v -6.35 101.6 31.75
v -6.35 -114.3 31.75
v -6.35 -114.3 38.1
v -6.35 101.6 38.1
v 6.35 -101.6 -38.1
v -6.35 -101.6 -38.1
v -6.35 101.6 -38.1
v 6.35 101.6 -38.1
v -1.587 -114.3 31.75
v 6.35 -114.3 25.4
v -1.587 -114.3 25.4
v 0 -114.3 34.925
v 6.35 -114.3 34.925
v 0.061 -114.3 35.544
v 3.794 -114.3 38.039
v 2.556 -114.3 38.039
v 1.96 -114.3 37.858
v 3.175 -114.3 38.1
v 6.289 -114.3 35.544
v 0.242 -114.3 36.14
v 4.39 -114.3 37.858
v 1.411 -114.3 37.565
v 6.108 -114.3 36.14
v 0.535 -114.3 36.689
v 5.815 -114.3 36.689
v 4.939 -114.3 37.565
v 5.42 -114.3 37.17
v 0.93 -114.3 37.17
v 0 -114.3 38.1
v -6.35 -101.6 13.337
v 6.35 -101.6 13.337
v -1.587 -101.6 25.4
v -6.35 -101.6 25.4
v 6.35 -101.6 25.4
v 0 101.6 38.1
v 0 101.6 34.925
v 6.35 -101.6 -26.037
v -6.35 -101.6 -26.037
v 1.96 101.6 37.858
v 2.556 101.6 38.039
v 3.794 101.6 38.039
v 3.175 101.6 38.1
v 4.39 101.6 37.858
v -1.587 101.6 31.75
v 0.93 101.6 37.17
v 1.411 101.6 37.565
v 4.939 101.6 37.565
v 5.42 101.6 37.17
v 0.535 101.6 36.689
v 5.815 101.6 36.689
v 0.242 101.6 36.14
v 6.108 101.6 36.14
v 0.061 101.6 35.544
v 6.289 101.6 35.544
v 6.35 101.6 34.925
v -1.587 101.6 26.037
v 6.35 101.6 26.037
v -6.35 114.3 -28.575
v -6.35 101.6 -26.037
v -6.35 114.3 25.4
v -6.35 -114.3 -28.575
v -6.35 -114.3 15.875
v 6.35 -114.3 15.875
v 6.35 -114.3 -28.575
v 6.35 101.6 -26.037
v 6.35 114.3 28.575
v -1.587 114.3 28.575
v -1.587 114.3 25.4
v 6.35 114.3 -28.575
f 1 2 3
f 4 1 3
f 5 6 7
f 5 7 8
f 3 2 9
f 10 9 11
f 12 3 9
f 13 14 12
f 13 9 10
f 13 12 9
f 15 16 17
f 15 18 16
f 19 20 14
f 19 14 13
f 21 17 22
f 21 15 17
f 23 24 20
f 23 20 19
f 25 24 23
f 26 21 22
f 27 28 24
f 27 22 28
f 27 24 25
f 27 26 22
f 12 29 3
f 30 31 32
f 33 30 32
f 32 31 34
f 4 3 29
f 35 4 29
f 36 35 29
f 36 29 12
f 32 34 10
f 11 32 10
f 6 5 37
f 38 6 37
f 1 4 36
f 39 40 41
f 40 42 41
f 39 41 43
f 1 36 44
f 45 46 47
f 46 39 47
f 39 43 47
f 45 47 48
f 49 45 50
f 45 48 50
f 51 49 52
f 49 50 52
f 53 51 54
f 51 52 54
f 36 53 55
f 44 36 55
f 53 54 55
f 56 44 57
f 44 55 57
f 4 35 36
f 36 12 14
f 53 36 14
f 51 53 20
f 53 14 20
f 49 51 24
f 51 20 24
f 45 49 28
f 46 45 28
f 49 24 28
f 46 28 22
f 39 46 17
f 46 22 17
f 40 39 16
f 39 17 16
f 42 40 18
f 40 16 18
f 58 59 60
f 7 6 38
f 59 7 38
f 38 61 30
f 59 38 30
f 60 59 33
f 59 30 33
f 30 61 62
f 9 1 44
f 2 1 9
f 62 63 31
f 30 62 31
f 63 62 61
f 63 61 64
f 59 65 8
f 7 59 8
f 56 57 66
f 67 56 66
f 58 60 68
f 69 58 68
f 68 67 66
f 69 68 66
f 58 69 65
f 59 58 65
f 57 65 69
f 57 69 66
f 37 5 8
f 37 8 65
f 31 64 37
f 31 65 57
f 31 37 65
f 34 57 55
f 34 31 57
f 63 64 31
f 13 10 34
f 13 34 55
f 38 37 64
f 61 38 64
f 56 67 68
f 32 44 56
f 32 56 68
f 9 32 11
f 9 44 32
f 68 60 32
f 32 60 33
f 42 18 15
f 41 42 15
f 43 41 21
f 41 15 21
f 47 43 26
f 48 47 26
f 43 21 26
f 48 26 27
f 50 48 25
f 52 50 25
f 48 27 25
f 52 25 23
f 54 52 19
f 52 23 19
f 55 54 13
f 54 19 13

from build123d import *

# Parameters (mm, degrees)
F0_W     = 12.7
F0_H     = 76.2
F1_DEPTH = 114.3
F3_DEPTH = 12.7
F4_W     = 228.6
F4_H     = 6.35
F5_DEPTH = 4.7625
F8_DEPTH = 215.9


with BuildPart() as f1:
    # F0 (on Front) → F1 (new body, symmetric)
    with BuildSketch(Plane.XZ):
        Rectangle(F0_W, F0_H)
    extrude(amount=F1_DEPTH, both=True)

    # F2 (on face) → F3 (cut, through all)
    with BuildSketch(Plane.YZ.offset(6.35)):
        Polygon((-101.6, 25.4), (-114.3, 25.4), (-114.3, 15.875), (-101.6, 13.33729), align=None)
        Polygon((-114.3, -28.575), (-114.3, -38.1), (-101.6, -38.1), (-101.6, -26.03729), align=None)
        Polygon((114.3, 28.575), (114.3, 38.1), (101.6, 38.1), (101.6, 26.03729), align=None)
        Polygon((101.6, -38.1), (114.3, -38.1), (114.3, -28.575), (101.6, -26.03729), align=None)
    extrude(amount=-F3_DEPTH, mode=Mode.SUBTRACT)

    # F4 (on face) → F5 (cut)
    with BuildSketch(Plane(origin=(-6.35, 0, 0), x_dir=(0, -1, 0), z_dir=(-1, 0, 0))):
        with Locations((0, 28.575)):
            Rectangle(F4_W, F4_H)
    extrude(amount=-F5_DEPTH, mode=Mode.SUBTRACT)

    # F7 (on face) → F8 (cut, through all)
    with BuildSketch(Plane.XZ.offset(114.3)):
        with BuildLine():
            ThreePointArc((0, 34.925), (0.929936, 37.170064), (3.175, 38.1))
            Line((3.175, 38.1), (0, 38.1))
            Line((0, 38.1), (0, 34.925))
        make_face()
        with BuildLine():
            ThreePointArc((3.175, 38.1), (5.420064, 37.170064), (6.35, 34.925))
            Line((6.35, 34.925), (6.35, 38.1))
            Line((6.35, 38.1), (3.175, 38.1))
        make_face()
    extrude(amount=-F8_DEPTH, mode=Mode.SUBTRACT)


solid = f1.part
